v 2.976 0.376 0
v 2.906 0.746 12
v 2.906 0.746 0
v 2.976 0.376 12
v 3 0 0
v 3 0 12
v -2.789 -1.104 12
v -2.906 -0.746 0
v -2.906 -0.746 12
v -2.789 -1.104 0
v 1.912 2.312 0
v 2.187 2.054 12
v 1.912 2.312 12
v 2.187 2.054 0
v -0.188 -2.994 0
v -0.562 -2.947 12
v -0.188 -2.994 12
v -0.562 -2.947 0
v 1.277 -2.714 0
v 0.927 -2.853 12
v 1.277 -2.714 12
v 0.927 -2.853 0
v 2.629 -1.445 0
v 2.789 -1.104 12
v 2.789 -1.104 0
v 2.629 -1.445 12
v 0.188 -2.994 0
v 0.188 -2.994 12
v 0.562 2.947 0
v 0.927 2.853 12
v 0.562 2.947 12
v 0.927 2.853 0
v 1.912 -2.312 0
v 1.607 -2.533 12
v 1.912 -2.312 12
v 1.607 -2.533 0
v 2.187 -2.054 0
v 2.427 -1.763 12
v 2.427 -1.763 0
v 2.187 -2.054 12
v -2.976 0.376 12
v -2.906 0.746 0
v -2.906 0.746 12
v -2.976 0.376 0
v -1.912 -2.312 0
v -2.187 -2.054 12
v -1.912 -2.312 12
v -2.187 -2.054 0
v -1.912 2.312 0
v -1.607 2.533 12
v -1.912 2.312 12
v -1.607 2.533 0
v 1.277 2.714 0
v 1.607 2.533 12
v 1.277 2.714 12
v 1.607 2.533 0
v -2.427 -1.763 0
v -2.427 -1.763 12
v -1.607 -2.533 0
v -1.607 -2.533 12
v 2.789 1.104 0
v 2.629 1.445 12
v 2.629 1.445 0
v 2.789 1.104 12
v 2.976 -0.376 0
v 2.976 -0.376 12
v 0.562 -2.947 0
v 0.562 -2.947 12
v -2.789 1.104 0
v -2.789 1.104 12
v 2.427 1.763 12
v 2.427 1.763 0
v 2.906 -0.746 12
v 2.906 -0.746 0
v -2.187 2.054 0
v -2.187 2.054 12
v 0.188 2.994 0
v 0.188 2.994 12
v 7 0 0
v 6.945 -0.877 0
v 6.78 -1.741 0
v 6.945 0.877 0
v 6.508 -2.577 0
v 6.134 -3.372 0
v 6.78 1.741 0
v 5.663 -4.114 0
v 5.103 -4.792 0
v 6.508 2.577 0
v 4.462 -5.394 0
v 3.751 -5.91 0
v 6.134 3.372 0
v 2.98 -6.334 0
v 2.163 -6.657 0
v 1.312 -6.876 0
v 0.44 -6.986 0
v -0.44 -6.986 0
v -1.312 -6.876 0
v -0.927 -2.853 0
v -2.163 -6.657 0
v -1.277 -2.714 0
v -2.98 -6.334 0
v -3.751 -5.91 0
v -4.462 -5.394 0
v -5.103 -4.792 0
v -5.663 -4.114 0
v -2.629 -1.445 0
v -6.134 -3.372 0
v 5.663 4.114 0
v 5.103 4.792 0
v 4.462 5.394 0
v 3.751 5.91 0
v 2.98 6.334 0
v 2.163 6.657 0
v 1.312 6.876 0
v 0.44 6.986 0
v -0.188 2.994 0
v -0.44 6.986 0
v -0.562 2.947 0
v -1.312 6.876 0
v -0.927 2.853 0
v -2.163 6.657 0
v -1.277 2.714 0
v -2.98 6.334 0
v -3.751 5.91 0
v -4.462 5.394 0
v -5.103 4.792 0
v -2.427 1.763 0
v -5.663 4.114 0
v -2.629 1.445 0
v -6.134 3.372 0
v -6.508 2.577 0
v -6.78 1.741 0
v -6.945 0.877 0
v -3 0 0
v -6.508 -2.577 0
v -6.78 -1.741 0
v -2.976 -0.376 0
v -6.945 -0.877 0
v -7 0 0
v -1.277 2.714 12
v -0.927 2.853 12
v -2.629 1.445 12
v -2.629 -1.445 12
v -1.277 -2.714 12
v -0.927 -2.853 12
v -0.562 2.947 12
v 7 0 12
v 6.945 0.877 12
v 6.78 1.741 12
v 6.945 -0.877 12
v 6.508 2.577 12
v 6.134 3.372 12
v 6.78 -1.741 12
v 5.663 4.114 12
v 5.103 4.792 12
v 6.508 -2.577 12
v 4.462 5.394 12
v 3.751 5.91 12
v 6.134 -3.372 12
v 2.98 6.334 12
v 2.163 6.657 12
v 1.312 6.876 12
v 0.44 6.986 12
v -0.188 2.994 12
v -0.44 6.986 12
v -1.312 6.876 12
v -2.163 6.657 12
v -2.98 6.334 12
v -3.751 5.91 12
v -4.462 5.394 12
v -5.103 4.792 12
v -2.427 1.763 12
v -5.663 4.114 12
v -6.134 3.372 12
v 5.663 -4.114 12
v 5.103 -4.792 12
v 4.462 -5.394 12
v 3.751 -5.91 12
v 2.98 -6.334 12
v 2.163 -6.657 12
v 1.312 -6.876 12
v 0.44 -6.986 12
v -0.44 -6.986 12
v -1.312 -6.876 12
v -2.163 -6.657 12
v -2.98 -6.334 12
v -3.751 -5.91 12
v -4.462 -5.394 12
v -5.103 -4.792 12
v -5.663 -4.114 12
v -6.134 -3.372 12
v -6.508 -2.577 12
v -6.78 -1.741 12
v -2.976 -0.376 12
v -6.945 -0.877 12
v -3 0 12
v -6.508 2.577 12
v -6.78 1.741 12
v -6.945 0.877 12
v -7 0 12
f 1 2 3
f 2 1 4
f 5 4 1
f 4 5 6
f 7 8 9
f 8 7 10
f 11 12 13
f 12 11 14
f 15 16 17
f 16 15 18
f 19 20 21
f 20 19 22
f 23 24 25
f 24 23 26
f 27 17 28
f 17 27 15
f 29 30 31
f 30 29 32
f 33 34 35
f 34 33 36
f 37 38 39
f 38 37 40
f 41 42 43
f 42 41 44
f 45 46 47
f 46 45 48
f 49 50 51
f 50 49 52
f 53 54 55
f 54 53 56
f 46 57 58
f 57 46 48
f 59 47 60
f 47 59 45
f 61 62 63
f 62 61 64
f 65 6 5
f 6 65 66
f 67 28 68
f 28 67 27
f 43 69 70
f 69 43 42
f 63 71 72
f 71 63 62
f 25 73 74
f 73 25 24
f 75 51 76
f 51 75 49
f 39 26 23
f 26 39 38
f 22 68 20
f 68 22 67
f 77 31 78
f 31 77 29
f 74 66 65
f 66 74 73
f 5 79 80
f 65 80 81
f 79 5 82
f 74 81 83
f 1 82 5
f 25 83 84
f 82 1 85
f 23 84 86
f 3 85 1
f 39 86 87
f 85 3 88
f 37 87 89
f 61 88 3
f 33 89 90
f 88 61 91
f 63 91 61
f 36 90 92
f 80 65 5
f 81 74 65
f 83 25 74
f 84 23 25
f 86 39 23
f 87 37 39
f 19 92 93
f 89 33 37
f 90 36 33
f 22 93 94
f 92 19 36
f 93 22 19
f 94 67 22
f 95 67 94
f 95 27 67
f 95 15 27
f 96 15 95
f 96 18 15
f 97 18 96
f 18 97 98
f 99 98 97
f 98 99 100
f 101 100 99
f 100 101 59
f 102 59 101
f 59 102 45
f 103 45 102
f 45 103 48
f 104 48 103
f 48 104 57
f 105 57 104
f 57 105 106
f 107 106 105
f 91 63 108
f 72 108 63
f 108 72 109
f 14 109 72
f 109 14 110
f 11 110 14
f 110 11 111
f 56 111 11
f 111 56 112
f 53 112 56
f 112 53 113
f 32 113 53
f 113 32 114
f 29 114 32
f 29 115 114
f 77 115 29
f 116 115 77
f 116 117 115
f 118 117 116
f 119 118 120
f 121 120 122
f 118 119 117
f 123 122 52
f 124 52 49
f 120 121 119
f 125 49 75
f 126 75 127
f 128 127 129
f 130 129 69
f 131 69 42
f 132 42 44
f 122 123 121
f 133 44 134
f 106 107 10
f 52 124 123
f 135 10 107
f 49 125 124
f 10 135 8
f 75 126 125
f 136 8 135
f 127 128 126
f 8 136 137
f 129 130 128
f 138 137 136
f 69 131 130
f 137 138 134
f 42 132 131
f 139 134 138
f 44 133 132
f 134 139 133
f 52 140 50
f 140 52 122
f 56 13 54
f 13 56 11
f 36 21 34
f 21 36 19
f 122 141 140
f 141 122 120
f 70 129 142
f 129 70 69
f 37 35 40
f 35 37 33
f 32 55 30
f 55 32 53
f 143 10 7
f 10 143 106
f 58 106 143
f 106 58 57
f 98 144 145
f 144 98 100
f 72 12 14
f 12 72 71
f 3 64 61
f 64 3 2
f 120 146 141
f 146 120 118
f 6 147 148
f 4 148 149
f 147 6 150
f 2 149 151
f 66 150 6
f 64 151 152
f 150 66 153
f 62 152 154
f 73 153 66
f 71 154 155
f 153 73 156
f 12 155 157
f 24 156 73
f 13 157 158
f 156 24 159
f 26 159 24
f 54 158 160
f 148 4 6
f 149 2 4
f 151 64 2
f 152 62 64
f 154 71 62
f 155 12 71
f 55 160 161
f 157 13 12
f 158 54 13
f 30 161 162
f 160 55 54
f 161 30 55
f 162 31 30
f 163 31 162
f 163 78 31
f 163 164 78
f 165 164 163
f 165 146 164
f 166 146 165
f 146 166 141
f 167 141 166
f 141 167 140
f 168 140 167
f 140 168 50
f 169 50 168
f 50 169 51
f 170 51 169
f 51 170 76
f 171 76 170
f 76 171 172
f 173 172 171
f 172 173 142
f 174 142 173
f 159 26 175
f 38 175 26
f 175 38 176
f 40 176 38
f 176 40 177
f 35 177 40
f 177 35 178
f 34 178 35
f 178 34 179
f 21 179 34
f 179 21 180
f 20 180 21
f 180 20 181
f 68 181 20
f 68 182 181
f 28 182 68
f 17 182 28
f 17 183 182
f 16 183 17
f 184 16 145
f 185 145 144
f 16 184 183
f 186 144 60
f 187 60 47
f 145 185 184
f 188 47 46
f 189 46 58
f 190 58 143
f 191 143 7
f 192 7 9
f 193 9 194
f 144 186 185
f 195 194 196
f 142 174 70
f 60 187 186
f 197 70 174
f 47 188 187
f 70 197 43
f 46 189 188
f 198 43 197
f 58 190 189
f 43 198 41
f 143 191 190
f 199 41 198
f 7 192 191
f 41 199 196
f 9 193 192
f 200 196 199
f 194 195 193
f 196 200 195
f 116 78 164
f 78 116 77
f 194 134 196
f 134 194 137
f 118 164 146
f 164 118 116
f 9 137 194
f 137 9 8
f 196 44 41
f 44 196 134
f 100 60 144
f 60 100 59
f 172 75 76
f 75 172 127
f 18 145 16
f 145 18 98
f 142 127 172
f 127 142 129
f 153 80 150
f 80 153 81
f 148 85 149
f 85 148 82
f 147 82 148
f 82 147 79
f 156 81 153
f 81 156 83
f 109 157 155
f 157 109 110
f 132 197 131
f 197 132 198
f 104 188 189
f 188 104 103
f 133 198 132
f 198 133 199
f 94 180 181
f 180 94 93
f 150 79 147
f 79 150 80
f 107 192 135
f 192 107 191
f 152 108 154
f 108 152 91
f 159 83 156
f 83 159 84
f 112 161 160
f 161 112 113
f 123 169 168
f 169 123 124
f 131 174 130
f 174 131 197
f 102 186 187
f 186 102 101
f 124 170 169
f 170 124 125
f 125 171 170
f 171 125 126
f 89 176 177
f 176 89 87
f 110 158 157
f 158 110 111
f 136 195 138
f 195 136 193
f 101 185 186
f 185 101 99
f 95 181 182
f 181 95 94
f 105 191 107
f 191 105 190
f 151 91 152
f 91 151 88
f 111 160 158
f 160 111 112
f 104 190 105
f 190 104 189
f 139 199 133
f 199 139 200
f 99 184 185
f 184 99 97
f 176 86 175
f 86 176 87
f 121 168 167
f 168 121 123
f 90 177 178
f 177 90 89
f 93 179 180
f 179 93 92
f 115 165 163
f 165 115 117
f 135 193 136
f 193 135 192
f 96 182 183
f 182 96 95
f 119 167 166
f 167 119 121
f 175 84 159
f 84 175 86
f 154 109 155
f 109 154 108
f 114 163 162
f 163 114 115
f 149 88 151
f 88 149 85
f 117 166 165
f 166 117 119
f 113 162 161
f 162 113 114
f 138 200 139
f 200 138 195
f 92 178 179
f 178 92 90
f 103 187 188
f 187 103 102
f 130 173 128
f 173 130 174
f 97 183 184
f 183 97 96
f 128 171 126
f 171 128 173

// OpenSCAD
$fn = 50;


difference() {
	union() {
		cylinder(h = 12, r = 7.0000000000);
	}
	union() {
		cylinder(h = 12, r = 3.0000000000);
		cylinder(h = 12, r = 3.0000000000);
		cylinder(h = 12, r = 1.5000000000);
		cylinder(h = 12, r = 1.5000000000);
		cylinder(h = 12, r = 1.5000000000);
		cylinder(h = 12, r = 1.5000000000);
		cylinder(h = 12, r = 1.5000000000);
		cylinder(h = 12, r = 1.5000000000);
	}
}
